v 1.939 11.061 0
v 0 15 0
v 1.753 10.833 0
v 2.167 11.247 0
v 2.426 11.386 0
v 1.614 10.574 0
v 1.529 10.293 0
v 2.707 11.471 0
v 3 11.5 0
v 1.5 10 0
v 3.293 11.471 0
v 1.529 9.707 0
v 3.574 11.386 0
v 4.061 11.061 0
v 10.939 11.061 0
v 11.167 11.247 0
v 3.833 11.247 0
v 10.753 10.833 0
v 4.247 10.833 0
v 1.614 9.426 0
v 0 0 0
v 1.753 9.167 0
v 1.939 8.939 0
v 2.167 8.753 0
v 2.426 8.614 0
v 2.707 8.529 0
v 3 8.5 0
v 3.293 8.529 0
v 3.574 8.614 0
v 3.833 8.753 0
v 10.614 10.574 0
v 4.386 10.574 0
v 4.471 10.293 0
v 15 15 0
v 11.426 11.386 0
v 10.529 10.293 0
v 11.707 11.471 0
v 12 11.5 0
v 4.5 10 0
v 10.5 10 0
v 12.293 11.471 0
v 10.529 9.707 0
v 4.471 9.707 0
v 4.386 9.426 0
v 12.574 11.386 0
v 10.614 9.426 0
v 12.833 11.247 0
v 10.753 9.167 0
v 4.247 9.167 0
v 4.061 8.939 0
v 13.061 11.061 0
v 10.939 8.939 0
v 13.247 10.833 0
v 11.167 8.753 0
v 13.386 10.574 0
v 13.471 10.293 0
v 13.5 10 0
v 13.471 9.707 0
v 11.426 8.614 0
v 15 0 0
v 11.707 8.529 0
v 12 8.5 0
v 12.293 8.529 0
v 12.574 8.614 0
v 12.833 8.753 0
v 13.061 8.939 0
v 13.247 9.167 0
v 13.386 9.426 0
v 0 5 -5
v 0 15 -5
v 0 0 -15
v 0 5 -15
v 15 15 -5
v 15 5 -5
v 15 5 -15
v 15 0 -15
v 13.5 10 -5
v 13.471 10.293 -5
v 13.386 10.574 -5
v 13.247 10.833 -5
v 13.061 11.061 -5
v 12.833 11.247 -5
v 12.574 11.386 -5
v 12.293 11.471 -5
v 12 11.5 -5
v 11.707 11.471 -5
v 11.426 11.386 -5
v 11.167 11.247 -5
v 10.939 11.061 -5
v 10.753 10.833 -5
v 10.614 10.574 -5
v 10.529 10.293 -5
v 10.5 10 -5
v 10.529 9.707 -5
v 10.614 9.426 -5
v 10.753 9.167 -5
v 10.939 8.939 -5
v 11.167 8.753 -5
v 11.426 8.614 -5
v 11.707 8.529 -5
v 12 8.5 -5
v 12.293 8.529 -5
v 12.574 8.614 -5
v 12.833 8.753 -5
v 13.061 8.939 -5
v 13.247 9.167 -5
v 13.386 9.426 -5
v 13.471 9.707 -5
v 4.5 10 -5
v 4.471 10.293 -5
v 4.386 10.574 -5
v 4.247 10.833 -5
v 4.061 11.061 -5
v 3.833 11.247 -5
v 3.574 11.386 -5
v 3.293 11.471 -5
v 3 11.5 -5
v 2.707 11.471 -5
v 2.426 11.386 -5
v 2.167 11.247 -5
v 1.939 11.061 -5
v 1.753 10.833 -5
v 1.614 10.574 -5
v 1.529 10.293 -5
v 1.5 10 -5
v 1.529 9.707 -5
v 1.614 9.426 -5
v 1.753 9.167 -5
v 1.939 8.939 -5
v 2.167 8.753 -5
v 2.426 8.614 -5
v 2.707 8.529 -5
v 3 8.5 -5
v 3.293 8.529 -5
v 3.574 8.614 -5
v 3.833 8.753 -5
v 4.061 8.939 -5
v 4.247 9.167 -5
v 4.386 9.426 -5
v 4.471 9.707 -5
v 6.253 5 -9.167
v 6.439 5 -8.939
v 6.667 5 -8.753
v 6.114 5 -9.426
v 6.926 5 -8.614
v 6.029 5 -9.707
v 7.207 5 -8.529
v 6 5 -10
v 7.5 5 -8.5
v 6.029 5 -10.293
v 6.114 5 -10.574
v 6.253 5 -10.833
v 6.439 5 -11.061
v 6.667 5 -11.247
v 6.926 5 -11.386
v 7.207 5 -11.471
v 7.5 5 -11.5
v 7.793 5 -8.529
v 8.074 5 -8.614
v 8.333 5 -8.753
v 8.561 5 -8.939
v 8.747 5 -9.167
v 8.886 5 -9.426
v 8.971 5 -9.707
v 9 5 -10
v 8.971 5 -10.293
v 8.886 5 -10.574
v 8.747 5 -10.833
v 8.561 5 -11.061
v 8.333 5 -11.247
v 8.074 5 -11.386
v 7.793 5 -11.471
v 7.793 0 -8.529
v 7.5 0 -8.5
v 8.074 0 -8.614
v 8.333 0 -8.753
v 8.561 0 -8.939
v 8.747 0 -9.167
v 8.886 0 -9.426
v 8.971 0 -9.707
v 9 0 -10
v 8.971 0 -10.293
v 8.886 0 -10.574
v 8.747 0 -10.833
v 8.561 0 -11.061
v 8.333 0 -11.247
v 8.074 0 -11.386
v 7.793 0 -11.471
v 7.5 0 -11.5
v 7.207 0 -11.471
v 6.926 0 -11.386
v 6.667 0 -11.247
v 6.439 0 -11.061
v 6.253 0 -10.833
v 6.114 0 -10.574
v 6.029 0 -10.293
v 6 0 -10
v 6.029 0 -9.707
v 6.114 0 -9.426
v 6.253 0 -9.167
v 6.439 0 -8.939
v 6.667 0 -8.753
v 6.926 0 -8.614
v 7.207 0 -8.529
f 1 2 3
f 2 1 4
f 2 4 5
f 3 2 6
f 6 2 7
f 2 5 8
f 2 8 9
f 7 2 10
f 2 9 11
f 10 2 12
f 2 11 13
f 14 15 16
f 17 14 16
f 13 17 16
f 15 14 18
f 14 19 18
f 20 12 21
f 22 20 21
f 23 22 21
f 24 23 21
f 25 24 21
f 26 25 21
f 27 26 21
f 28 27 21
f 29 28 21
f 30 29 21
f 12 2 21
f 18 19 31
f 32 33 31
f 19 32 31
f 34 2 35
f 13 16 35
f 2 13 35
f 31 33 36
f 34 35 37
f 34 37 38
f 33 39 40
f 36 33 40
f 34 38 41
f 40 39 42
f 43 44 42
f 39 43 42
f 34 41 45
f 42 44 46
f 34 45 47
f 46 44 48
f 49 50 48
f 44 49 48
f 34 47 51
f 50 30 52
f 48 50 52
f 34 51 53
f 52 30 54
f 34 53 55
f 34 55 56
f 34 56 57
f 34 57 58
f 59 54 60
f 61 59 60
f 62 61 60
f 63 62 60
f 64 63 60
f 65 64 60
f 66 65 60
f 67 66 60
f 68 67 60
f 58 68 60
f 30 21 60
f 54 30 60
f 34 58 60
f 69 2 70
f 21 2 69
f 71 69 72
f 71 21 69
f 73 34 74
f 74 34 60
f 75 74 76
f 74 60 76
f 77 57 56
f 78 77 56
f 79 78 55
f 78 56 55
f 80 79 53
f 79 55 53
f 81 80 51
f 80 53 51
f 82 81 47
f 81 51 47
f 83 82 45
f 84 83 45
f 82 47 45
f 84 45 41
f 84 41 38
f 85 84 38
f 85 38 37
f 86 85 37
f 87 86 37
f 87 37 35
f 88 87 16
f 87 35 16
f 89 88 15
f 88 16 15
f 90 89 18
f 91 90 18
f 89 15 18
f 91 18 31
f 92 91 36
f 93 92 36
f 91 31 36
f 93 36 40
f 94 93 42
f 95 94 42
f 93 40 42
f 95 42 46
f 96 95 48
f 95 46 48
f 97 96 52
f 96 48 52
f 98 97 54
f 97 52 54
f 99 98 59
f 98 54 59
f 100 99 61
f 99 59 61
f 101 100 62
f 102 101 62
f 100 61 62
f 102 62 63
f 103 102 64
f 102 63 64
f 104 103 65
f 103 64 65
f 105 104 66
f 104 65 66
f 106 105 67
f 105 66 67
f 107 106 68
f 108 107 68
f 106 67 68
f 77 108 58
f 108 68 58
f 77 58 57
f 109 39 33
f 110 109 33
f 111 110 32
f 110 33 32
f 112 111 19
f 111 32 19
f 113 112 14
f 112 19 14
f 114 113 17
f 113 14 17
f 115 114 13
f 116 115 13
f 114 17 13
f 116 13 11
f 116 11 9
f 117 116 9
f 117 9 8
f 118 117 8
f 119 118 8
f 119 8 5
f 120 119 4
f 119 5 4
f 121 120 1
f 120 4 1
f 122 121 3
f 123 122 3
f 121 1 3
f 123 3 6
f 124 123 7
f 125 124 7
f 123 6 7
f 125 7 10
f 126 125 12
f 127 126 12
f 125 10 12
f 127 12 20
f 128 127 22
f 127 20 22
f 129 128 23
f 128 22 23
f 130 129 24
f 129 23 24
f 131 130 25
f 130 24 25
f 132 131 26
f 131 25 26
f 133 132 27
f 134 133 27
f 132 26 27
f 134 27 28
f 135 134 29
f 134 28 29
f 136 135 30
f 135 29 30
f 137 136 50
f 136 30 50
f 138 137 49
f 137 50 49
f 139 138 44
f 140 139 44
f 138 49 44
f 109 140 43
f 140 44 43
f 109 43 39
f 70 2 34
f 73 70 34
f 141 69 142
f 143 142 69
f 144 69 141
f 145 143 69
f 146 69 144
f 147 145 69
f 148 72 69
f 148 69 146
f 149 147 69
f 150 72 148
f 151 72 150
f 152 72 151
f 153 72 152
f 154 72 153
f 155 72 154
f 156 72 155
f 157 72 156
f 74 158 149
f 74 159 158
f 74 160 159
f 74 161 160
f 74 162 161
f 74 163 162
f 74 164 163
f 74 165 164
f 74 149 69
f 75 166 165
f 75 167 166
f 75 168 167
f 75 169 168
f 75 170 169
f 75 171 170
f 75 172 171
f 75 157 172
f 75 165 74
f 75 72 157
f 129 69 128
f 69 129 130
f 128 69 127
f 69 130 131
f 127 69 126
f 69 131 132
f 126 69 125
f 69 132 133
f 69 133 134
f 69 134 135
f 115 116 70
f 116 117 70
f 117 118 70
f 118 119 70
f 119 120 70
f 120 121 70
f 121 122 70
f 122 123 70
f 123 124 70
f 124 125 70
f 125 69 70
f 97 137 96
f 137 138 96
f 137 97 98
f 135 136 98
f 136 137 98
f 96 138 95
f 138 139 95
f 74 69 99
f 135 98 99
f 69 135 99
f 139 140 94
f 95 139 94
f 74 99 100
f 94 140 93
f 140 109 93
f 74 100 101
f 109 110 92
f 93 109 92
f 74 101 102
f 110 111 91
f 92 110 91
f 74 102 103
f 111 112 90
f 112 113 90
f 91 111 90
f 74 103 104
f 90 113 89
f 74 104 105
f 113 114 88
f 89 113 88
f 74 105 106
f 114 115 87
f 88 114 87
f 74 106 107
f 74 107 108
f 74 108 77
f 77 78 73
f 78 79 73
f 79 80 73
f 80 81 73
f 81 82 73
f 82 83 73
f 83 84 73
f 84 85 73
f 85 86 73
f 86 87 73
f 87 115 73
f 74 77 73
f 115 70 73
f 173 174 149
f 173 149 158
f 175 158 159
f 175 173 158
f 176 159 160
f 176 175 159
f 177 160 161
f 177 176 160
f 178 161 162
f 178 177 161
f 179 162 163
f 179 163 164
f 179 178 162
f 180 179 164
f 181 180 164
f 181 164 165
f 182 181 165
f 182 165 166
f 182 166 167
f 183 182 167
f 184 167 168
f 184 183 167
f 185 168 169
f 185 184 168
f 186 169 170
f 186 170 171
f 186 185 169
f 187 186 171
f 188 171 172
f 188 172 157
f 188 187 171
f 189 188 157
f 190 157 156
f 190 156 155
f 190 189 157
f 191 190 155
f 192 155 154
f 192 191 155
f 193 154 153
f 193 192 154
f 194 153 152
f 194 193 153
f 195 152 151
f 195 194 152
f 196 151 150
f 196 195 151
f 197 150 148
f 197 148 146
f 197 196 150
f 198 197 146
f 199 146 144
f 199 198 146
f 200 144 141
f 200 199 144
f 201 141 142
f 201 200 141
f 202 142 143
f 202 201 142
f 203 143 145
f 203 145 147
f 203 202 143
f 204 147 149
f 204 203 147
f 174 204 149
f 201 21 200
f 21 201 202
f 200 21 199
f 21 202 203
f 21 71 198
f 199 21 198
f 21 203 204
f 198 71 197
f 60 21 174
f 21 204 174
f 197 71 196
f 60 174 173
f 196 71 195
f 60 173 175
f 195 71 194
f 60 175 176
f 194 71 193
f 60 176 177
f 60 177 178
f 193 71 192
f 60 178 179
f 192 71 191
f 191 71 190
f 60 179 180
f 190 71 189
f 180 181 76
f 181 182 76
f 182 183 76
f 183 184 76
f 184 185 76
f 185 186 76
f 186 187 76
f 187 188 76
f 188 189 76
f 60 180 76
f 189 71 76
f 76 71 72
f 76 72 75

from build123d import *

# Parameters (mm, degrees)
SKETCH_1_W      = 15
SKETCH_1_H      = 15
SKETCH_1_R      = 1.5
EXTRUDE_1_DEPTH = 5
SKETCH_2_W      = 15
SKETCH_2_H      = 15
SKETCH_2_R      = 1.5
EXTRUDE_2_DEPTH = 5


with BuildPart() as part:
    # 草图1 → 凸台-拉伸1 (new body)
    with BuildSketch(Plane(origin=(0, 0, 0), x_dir=(1, 0, 0), z_dir=(0, 1, 0))):
        with Locations((7.5, 7.5)):
            Rectangle(SKETCH_1_W, SKETCH_1_H)
        with Locations(Location((7.5, 10, 0), (0, 0, 270))):
            Circle(SKETCH_1_R, mode=Mode.SUBTRACT)
    extrude(amount=EXTRUDE_1_DEPTH)

    # 草图2 → 凸台-拉伸2 (add)
    with BuildSketch(Plane.XY):
        with Locations((7.5, 7.5)):
            Rectangle(SKETCH_2_W, SKETCH_2_H)
        with Locations((3, 10)):
            Circle(SKETCH_2_R, mode=Mode.SUBTRACT)
        with Locations((12, 10)):
            Circle(SKETCH_2_R, mode=Mode.SUBTRACT)
    extrude(amount=-EXTRUDE_2_DEPTH)


solid = part.part
